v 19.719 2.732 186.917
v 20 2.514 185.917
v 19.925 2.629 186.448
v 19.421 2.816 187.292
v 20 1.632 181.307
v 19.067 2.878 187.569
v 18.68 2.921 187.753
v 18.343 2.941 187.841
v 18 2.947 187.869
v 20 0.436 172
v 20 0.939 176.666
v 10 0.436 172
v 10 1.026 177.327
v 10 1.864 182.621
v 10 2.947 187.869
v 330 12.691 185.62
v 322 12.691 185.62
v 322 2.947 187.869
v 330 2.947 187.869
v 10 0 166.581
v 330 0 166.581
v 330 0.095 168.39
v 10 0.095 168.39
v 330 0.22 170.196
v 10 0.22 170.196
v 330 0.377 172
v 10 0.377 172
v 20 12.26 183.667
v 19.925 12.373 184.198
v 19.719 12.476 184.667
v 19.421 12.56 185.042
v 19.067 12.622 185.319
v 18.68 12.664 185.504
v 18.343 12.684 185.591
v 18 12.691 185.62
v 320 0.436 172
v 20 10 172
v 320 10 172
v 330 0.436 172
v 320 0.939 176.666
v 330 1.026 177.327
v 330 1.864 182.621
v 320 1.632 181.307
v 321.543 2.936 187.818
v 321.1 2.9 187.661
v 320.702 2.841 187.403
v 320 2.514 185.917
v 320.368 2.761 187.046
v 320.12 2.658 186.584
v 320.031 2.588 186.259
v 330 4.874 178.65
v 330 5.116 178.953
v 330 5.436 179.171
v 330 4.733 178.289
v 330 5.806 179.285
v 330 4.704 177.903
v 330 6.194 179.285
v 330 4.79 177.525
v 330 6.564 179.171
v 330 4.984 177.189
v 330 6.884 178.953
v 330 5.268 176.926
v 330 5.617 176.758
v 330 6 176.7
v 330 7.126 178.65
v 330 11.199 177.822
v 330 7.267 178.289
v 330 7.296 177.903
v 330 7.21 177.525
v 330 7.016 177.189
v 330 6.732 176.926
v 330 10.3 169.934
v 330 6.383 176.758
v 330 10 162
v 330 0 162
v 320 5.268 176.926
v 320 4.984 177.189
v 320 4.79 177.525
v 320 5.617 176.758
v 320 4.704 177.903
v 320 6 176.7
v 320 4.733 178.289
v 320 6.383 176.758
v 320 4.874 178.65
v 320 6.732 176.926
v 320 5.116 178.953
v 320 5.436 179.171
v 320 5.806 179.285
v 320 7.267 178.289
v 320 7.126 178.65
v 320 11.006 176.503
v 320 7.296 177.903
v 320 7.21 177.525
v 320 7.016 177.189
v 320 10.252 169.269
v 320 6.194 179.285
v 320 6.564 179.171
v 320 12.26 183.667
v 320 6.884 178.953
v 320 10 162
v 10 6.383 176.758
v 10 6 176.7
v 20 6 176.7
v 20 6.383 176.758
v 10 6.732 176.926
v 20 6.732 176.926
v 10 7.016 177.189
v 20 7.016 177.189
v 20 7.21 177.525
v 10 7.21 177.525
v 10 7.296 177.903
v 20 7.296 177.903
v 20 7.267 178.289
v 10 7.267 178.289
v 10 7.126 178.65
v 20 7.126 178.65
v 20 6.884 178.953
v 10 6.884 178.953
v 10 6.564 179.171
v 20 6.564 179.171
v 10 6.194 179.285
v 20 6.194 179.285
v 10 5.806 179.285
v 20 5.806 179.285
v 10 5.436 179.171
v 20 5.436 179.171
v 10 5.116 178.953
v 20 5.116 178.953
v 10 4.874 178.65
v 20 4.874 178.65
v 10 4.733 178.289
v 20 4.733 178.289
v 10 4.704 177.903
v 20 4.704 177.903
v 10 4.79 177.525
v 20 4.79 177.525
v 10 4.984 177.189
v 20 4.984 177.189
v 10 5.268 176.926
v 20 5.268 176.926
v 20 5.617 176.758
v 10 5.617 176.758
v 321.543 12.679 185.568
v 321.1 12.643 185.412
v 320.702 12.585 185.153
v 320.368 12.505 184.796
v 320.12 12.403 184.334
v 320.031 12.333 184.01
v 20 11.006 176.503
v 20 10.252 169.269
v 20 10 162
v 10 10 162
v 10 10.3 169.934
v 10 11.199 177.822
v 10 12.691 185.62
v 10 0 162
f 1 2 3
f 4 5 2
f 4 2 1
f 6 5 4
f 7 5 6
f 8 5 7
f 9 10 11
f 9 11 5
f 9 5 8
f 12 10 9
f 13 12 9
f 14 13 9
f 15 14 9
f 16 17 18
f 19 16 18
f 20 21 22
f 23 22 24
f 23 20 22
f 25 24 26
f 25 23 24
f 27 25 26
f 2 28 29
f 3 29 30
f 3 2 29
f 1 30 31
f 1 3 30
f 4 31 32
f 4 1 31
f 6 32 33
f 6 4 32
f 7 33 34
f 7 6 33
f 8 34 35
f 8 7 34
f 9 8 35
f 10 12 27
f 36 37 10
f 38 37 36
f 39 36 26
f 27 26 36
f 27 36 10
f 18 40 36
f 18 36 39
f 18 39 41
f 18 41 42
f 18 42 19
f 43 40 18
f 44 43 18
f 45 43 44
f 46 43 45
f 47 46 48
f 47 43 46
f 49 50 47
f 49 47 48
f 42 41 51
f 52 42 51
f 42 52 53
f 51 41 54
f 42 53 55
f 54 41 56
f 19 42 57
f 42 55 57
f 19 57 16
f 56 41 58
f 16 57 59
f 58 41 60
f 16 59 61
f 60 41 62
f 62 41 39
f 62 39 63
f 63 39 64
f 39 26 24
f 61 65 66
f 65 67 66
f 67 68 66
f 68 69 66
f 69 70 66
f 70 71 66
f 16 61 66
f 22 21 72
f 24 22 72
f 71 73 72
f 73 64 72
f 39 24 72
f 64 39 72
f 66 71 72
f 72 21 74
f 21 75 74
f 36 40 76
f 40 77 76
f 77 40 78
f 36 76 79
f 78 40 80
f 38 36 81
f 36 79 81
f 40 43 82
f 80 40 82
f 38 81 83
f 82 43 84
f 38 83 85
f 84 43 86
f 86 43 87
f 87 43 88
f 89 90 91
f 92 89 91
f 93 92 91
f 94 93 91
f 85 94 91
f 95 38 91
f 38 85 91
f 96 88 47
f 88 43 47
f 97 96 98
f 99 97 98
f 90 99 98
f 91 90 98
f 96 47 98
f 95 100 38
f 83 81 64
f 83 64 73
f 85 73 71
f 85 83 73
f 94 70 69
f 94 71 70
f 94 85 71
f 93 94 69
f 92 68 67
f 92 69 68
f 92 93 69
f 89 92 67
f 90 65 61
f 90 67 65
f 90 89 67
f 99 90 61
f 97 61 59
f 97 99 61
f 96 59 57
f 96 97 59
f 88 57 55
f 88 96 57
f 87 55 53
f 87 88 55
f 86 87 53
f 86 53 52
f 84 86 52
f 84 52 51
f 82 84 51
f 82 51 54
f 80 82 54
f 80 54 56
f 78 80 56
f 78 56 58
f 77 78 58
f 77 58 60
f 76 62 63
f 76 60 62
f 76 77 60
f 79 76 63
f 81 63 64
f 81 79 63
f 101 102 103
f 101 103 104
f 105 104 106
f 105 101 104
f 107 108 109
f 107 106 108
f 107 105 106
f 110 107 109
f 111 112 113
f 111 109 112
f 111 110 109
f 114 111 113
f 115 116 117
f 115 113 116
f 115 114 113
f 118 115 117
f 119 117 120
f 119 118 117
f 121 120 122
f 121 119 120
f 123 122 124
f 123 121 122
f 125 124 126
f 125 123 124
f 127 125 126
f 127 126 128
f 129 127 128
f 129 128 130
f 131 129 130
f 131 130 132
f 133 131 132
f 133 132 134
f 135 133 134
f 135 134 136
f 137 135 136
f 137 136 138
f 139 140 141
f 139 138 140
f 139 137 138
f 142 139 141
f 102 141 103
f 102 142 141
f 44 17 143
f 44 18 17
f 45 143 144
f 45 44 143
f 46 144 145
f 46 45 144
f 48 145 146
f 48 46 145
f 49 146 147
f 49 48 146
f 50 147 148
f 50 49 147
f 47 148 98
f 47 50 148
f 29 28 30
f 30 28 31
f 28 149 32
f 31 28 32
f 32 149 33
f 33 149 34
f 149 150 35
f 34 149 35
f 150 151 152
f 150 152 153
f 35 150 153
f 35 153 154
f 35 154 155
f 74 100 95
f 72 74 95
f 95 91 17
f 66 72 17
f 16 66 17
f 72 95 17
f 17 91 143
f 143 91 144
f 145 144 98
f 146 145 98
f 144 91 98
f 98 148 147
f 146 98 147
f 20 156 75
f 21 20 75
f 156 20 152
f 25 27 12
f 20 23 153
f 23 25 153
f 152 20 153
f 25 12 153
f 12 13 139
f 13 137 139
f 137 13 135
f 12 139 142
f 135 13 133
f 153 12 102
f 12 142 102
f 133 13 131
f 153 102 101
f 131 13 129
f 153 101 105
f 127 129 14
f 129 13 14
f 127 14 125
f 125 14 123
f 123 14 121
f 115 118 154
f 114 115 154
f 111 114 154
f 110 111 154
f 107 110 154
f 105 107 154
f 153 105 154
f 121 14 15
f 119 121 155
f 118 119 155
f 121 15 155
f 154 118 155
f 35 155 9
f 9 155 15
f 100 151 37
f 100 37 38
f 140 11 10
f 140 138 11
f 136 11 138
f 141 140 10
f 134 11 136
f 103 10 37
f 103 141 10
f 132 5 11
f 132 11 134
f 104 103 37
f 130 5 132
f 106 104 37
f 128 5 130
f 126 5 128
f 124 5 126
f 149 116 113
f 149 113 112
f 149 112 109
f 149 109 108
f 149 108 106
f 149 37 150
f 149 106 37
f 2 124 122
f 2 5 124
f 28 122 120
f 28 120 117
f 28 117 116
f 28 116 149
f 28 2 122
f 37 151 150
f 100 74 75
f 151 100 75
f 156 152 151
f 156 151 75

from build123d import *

# Parameters (mm, degrees)
CYLINDER066_R     = 1.3
CYLINDER066_DEPTH = 331
CYLINDER070_W     = 105
CYLINDER070_H     = 10
CYLINDER070_ANGLE = 13
CYLINDER065_W     = 115
CYLINDER065_H     = 10
CYLINDER065_ANGLE = 13
FILLET011_R       = 2
CYLINDER068_W     = 105
CYLINDER068_H     = 352
CYLINDER068_ANGLE = 13
CYLINDER067_W     = 115
CYLINDER067_H     = 340
CYLINDER067_ANGLE = 13
BOX103_W          = 320
BOX103_H          = 10
BOX103_DEPTH      = 10
CYLINDER069_W     = 105
CYLINDER069_H     = 10
CYLINDER069_ANGLE = 13
CYLINDER064_W     = 115
CYLINDER064_H     = 10
CYLINDER064_ANGLE = 13
FILLET010_R       = 2


with BuildPart() as cilindro066:
    # Cylinder066 → Cylinder066 (new body)
    with BuildSketch(Plane(origin=(5, 6, 178), x_dir=(0, 0, -1), z_dir=(1, 0, 0))):
        Circle(CYLINDER066_R)
    extrude(amount=CYLINDER066_DEPTH)


with BuildPart() as cilindro070:
    # Cylinder070 → Cylinder070 (revolve)
    with BuildSketch(Plane(origin=(20, 115, 162), x_dir=(0, -1, 0), z_dir=(0, 0, -1))):
        with Locations((52.5, 5)):
            Rectangle(CYLINDER070_W, CYLINDER070_H)
    revolve(axis=Axis((20, 115, 162), (-1, 0, 0)), revolution_arc=CYLINDER070_ANGLE)


with BuildPart() as fillet011:
    # Cylinder065 → Cylinder065 (revolve)
    with BuildSketch(Plane(origin=(20, 115, 162), x_dir=(0, -1, 0), z_dir=(0, 0, -1))):
        with Locations((57.5, 5)):
            Rectangle(CYLINDER065_W, CYLINDER065_H)
    revolve(axis=Axis((20, 115, 162), (-1, 0, 0)), revolution_arc=CYLINDER065_ANGLE)

    # Cut075: cut Cilindro070
    add(cilindro070.part, mode=Mode.SUBTRACT)

    # Fillet011
    fillet011_edges = [fillet011.edges().sort_by_distance(p)[0] for p in [
        (20, 7.819293, 186.744616),
    ]]
    fillet(fillet011_edges, radius=FILLET011_R)


with BuildPart() as cilindro068:
    # Cylinder068 → Cylinder068 (revolve)
    with BuildSketch(Plane(origin=(340, 115, 162), x_dir=(0, -1, 0), z_dir=(0, 0, -1))):
        with Locations((52.5, 176)):
            Rectangle(CYLINDER068_W, CYLINDER068_H)
    revolve(axis=Axis((340, 115, 162), (-1, 0, 0)), revolution_arc=CYLINDER068_ANGLE)


with BuildPart() as cut078:
    # Cylinder067 → Cylinder067 (revolve)
    with BuildSketch(Plane(origin=(340, 115, 162), x_dir=(0, -1, 0), z_dir=(0, 0, -1))):
        with Locations((57.5, 170)):
            Rectangle(CYLINDER067_W, CYLINDER067_H)
    revolve(axis=Axis((340, 115, 162), (-1, 0, 0)), revolution_arc=CYLINDER067_ANGLE)

    # Cut078: cut Cilindro068
    add(cilindro068.part, mode=Mode.SUBTRACT)


with BuildPart() as cut078_1:
    # Cut078 placement: moved
    add(cut078.part.moved(Location((0, -10.1, 0))))


with BuildPart() as cut079:
    # Box103 → Box103 (new body)
    with BuildSketch(Plane(origin=(10, 0, 162), x_dir=(1, 0, 0), z_dir=(0, 0, 1))):
        with Locations((160, 5)):
            Rectangle(BOX103_W, BOX103_H)
    extrude(amount=BOX103_DEPTH)

    # Cut079: cut Cut078
    add(cut078_1.part, mode=Mode.SUBTRACT)


with BuildPart() as cilindro069:
    # Cylinder069 → Cylinder069 (revolve)
    with BuildSketch(Plane(origin=(20, 115, 162), x_dir=(0, -1, 0), z_dir=(0, 0, -1))):
        with Locations((52.5, 5)):
            Rectangle(CYLINDER069_W, CYLINDER069_H)
    revolve(axis=Axis((20, 115, 162), (-1, 0, 0)), revolution_arc=CYLINDER069_ANGLE)


with BuildPart() as cut076:
    # Cylinder064 → Cylinder064 (revolve)
    with BuildSketch(Plane(origin=(20, 115, 162), x_dir=(0, -1, 0), z_dir=(0, 0, -1))):
        with Locations((57.5, 5)):
            Rectangle(CYLINDER064_W, CYLINDER064_H)
    revolve(axis=Axis((20, 115, 162), (-1, 0, 0)), revolution_arc=CYLINDER064_ANGLE)

    # Cut077: cut Cilindro069
    add(cilindro069.part, mode=Mode.SUBTRACT)


with BuildPart() as cut076_1:
    # Cut077 placement: moved
    add(cut076.part.moved(Location((310, 0, 0))))

    # Fillet010
    fillet010_edges = [cut076_1.edges().sort_by_distance(p)[0] for p in [
        (320, 7.819293, 186.744616),
    ]]
    fillet(fillet010_edges, radius=FILLET010_R)

    # Fusion017: union Fillet011, Cut079
    add(fillet011.part)
    add(cut079.part)

    # Cut076: cut Cilindro066
    add(cilindro066.part, mode=Mode.SUBTRACT)


solid = cut076_1.part
